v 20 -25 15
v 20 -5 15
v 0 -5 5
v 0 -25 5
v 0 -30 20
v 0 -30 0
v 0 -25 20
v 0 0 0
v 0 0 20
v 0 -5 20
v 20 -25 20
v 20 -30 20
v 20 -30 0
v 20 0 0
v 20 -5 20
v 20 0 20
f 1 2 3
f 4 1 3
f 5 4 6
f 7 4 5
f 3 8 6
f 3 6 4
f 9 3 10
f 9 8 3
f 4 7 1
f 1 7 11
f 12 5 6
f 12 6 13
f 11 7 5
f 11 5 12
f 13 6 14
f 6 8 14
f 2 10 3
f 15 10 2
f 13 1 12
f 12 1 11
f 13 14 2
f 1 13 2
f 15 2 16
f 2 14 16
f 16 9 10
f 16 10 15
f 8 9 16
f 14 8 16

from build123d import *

# Parameters (mm, degrees)
F0_W     = 20
F0_H     = 20
F1_DEPTH = 5
F3_DEPTH = 20
F4_W     = 20
F4_H     = 20
F5_DEPTH = 5


with BuildPart() as f1:
    # F0 (on Front) → F1 (new body)
    with BuildSketch(Plane.XZ):
        with Locations((10, 10)):
            Rectangle(F0_W, F0_H)
    extrude(amount=F1_DEPTH)

    # F2 (on face) → F3 (join)
    with BuildSketch(Plane.XZ.offset(5)):
        Polygon((0, 5), (0, 0), (20, 0), (20, 15), align=None)
    extrude(amount=F3_DEPTH)

    # F4 (on face) → F5 (join)
    with BuildSketch(Plane.XZ.offset(25)):
        with Locations((10, 10)):
            Rectangle(F4_W, F4_H)
    extrude(amount=F5_DEPTH)


solid = f1.part
